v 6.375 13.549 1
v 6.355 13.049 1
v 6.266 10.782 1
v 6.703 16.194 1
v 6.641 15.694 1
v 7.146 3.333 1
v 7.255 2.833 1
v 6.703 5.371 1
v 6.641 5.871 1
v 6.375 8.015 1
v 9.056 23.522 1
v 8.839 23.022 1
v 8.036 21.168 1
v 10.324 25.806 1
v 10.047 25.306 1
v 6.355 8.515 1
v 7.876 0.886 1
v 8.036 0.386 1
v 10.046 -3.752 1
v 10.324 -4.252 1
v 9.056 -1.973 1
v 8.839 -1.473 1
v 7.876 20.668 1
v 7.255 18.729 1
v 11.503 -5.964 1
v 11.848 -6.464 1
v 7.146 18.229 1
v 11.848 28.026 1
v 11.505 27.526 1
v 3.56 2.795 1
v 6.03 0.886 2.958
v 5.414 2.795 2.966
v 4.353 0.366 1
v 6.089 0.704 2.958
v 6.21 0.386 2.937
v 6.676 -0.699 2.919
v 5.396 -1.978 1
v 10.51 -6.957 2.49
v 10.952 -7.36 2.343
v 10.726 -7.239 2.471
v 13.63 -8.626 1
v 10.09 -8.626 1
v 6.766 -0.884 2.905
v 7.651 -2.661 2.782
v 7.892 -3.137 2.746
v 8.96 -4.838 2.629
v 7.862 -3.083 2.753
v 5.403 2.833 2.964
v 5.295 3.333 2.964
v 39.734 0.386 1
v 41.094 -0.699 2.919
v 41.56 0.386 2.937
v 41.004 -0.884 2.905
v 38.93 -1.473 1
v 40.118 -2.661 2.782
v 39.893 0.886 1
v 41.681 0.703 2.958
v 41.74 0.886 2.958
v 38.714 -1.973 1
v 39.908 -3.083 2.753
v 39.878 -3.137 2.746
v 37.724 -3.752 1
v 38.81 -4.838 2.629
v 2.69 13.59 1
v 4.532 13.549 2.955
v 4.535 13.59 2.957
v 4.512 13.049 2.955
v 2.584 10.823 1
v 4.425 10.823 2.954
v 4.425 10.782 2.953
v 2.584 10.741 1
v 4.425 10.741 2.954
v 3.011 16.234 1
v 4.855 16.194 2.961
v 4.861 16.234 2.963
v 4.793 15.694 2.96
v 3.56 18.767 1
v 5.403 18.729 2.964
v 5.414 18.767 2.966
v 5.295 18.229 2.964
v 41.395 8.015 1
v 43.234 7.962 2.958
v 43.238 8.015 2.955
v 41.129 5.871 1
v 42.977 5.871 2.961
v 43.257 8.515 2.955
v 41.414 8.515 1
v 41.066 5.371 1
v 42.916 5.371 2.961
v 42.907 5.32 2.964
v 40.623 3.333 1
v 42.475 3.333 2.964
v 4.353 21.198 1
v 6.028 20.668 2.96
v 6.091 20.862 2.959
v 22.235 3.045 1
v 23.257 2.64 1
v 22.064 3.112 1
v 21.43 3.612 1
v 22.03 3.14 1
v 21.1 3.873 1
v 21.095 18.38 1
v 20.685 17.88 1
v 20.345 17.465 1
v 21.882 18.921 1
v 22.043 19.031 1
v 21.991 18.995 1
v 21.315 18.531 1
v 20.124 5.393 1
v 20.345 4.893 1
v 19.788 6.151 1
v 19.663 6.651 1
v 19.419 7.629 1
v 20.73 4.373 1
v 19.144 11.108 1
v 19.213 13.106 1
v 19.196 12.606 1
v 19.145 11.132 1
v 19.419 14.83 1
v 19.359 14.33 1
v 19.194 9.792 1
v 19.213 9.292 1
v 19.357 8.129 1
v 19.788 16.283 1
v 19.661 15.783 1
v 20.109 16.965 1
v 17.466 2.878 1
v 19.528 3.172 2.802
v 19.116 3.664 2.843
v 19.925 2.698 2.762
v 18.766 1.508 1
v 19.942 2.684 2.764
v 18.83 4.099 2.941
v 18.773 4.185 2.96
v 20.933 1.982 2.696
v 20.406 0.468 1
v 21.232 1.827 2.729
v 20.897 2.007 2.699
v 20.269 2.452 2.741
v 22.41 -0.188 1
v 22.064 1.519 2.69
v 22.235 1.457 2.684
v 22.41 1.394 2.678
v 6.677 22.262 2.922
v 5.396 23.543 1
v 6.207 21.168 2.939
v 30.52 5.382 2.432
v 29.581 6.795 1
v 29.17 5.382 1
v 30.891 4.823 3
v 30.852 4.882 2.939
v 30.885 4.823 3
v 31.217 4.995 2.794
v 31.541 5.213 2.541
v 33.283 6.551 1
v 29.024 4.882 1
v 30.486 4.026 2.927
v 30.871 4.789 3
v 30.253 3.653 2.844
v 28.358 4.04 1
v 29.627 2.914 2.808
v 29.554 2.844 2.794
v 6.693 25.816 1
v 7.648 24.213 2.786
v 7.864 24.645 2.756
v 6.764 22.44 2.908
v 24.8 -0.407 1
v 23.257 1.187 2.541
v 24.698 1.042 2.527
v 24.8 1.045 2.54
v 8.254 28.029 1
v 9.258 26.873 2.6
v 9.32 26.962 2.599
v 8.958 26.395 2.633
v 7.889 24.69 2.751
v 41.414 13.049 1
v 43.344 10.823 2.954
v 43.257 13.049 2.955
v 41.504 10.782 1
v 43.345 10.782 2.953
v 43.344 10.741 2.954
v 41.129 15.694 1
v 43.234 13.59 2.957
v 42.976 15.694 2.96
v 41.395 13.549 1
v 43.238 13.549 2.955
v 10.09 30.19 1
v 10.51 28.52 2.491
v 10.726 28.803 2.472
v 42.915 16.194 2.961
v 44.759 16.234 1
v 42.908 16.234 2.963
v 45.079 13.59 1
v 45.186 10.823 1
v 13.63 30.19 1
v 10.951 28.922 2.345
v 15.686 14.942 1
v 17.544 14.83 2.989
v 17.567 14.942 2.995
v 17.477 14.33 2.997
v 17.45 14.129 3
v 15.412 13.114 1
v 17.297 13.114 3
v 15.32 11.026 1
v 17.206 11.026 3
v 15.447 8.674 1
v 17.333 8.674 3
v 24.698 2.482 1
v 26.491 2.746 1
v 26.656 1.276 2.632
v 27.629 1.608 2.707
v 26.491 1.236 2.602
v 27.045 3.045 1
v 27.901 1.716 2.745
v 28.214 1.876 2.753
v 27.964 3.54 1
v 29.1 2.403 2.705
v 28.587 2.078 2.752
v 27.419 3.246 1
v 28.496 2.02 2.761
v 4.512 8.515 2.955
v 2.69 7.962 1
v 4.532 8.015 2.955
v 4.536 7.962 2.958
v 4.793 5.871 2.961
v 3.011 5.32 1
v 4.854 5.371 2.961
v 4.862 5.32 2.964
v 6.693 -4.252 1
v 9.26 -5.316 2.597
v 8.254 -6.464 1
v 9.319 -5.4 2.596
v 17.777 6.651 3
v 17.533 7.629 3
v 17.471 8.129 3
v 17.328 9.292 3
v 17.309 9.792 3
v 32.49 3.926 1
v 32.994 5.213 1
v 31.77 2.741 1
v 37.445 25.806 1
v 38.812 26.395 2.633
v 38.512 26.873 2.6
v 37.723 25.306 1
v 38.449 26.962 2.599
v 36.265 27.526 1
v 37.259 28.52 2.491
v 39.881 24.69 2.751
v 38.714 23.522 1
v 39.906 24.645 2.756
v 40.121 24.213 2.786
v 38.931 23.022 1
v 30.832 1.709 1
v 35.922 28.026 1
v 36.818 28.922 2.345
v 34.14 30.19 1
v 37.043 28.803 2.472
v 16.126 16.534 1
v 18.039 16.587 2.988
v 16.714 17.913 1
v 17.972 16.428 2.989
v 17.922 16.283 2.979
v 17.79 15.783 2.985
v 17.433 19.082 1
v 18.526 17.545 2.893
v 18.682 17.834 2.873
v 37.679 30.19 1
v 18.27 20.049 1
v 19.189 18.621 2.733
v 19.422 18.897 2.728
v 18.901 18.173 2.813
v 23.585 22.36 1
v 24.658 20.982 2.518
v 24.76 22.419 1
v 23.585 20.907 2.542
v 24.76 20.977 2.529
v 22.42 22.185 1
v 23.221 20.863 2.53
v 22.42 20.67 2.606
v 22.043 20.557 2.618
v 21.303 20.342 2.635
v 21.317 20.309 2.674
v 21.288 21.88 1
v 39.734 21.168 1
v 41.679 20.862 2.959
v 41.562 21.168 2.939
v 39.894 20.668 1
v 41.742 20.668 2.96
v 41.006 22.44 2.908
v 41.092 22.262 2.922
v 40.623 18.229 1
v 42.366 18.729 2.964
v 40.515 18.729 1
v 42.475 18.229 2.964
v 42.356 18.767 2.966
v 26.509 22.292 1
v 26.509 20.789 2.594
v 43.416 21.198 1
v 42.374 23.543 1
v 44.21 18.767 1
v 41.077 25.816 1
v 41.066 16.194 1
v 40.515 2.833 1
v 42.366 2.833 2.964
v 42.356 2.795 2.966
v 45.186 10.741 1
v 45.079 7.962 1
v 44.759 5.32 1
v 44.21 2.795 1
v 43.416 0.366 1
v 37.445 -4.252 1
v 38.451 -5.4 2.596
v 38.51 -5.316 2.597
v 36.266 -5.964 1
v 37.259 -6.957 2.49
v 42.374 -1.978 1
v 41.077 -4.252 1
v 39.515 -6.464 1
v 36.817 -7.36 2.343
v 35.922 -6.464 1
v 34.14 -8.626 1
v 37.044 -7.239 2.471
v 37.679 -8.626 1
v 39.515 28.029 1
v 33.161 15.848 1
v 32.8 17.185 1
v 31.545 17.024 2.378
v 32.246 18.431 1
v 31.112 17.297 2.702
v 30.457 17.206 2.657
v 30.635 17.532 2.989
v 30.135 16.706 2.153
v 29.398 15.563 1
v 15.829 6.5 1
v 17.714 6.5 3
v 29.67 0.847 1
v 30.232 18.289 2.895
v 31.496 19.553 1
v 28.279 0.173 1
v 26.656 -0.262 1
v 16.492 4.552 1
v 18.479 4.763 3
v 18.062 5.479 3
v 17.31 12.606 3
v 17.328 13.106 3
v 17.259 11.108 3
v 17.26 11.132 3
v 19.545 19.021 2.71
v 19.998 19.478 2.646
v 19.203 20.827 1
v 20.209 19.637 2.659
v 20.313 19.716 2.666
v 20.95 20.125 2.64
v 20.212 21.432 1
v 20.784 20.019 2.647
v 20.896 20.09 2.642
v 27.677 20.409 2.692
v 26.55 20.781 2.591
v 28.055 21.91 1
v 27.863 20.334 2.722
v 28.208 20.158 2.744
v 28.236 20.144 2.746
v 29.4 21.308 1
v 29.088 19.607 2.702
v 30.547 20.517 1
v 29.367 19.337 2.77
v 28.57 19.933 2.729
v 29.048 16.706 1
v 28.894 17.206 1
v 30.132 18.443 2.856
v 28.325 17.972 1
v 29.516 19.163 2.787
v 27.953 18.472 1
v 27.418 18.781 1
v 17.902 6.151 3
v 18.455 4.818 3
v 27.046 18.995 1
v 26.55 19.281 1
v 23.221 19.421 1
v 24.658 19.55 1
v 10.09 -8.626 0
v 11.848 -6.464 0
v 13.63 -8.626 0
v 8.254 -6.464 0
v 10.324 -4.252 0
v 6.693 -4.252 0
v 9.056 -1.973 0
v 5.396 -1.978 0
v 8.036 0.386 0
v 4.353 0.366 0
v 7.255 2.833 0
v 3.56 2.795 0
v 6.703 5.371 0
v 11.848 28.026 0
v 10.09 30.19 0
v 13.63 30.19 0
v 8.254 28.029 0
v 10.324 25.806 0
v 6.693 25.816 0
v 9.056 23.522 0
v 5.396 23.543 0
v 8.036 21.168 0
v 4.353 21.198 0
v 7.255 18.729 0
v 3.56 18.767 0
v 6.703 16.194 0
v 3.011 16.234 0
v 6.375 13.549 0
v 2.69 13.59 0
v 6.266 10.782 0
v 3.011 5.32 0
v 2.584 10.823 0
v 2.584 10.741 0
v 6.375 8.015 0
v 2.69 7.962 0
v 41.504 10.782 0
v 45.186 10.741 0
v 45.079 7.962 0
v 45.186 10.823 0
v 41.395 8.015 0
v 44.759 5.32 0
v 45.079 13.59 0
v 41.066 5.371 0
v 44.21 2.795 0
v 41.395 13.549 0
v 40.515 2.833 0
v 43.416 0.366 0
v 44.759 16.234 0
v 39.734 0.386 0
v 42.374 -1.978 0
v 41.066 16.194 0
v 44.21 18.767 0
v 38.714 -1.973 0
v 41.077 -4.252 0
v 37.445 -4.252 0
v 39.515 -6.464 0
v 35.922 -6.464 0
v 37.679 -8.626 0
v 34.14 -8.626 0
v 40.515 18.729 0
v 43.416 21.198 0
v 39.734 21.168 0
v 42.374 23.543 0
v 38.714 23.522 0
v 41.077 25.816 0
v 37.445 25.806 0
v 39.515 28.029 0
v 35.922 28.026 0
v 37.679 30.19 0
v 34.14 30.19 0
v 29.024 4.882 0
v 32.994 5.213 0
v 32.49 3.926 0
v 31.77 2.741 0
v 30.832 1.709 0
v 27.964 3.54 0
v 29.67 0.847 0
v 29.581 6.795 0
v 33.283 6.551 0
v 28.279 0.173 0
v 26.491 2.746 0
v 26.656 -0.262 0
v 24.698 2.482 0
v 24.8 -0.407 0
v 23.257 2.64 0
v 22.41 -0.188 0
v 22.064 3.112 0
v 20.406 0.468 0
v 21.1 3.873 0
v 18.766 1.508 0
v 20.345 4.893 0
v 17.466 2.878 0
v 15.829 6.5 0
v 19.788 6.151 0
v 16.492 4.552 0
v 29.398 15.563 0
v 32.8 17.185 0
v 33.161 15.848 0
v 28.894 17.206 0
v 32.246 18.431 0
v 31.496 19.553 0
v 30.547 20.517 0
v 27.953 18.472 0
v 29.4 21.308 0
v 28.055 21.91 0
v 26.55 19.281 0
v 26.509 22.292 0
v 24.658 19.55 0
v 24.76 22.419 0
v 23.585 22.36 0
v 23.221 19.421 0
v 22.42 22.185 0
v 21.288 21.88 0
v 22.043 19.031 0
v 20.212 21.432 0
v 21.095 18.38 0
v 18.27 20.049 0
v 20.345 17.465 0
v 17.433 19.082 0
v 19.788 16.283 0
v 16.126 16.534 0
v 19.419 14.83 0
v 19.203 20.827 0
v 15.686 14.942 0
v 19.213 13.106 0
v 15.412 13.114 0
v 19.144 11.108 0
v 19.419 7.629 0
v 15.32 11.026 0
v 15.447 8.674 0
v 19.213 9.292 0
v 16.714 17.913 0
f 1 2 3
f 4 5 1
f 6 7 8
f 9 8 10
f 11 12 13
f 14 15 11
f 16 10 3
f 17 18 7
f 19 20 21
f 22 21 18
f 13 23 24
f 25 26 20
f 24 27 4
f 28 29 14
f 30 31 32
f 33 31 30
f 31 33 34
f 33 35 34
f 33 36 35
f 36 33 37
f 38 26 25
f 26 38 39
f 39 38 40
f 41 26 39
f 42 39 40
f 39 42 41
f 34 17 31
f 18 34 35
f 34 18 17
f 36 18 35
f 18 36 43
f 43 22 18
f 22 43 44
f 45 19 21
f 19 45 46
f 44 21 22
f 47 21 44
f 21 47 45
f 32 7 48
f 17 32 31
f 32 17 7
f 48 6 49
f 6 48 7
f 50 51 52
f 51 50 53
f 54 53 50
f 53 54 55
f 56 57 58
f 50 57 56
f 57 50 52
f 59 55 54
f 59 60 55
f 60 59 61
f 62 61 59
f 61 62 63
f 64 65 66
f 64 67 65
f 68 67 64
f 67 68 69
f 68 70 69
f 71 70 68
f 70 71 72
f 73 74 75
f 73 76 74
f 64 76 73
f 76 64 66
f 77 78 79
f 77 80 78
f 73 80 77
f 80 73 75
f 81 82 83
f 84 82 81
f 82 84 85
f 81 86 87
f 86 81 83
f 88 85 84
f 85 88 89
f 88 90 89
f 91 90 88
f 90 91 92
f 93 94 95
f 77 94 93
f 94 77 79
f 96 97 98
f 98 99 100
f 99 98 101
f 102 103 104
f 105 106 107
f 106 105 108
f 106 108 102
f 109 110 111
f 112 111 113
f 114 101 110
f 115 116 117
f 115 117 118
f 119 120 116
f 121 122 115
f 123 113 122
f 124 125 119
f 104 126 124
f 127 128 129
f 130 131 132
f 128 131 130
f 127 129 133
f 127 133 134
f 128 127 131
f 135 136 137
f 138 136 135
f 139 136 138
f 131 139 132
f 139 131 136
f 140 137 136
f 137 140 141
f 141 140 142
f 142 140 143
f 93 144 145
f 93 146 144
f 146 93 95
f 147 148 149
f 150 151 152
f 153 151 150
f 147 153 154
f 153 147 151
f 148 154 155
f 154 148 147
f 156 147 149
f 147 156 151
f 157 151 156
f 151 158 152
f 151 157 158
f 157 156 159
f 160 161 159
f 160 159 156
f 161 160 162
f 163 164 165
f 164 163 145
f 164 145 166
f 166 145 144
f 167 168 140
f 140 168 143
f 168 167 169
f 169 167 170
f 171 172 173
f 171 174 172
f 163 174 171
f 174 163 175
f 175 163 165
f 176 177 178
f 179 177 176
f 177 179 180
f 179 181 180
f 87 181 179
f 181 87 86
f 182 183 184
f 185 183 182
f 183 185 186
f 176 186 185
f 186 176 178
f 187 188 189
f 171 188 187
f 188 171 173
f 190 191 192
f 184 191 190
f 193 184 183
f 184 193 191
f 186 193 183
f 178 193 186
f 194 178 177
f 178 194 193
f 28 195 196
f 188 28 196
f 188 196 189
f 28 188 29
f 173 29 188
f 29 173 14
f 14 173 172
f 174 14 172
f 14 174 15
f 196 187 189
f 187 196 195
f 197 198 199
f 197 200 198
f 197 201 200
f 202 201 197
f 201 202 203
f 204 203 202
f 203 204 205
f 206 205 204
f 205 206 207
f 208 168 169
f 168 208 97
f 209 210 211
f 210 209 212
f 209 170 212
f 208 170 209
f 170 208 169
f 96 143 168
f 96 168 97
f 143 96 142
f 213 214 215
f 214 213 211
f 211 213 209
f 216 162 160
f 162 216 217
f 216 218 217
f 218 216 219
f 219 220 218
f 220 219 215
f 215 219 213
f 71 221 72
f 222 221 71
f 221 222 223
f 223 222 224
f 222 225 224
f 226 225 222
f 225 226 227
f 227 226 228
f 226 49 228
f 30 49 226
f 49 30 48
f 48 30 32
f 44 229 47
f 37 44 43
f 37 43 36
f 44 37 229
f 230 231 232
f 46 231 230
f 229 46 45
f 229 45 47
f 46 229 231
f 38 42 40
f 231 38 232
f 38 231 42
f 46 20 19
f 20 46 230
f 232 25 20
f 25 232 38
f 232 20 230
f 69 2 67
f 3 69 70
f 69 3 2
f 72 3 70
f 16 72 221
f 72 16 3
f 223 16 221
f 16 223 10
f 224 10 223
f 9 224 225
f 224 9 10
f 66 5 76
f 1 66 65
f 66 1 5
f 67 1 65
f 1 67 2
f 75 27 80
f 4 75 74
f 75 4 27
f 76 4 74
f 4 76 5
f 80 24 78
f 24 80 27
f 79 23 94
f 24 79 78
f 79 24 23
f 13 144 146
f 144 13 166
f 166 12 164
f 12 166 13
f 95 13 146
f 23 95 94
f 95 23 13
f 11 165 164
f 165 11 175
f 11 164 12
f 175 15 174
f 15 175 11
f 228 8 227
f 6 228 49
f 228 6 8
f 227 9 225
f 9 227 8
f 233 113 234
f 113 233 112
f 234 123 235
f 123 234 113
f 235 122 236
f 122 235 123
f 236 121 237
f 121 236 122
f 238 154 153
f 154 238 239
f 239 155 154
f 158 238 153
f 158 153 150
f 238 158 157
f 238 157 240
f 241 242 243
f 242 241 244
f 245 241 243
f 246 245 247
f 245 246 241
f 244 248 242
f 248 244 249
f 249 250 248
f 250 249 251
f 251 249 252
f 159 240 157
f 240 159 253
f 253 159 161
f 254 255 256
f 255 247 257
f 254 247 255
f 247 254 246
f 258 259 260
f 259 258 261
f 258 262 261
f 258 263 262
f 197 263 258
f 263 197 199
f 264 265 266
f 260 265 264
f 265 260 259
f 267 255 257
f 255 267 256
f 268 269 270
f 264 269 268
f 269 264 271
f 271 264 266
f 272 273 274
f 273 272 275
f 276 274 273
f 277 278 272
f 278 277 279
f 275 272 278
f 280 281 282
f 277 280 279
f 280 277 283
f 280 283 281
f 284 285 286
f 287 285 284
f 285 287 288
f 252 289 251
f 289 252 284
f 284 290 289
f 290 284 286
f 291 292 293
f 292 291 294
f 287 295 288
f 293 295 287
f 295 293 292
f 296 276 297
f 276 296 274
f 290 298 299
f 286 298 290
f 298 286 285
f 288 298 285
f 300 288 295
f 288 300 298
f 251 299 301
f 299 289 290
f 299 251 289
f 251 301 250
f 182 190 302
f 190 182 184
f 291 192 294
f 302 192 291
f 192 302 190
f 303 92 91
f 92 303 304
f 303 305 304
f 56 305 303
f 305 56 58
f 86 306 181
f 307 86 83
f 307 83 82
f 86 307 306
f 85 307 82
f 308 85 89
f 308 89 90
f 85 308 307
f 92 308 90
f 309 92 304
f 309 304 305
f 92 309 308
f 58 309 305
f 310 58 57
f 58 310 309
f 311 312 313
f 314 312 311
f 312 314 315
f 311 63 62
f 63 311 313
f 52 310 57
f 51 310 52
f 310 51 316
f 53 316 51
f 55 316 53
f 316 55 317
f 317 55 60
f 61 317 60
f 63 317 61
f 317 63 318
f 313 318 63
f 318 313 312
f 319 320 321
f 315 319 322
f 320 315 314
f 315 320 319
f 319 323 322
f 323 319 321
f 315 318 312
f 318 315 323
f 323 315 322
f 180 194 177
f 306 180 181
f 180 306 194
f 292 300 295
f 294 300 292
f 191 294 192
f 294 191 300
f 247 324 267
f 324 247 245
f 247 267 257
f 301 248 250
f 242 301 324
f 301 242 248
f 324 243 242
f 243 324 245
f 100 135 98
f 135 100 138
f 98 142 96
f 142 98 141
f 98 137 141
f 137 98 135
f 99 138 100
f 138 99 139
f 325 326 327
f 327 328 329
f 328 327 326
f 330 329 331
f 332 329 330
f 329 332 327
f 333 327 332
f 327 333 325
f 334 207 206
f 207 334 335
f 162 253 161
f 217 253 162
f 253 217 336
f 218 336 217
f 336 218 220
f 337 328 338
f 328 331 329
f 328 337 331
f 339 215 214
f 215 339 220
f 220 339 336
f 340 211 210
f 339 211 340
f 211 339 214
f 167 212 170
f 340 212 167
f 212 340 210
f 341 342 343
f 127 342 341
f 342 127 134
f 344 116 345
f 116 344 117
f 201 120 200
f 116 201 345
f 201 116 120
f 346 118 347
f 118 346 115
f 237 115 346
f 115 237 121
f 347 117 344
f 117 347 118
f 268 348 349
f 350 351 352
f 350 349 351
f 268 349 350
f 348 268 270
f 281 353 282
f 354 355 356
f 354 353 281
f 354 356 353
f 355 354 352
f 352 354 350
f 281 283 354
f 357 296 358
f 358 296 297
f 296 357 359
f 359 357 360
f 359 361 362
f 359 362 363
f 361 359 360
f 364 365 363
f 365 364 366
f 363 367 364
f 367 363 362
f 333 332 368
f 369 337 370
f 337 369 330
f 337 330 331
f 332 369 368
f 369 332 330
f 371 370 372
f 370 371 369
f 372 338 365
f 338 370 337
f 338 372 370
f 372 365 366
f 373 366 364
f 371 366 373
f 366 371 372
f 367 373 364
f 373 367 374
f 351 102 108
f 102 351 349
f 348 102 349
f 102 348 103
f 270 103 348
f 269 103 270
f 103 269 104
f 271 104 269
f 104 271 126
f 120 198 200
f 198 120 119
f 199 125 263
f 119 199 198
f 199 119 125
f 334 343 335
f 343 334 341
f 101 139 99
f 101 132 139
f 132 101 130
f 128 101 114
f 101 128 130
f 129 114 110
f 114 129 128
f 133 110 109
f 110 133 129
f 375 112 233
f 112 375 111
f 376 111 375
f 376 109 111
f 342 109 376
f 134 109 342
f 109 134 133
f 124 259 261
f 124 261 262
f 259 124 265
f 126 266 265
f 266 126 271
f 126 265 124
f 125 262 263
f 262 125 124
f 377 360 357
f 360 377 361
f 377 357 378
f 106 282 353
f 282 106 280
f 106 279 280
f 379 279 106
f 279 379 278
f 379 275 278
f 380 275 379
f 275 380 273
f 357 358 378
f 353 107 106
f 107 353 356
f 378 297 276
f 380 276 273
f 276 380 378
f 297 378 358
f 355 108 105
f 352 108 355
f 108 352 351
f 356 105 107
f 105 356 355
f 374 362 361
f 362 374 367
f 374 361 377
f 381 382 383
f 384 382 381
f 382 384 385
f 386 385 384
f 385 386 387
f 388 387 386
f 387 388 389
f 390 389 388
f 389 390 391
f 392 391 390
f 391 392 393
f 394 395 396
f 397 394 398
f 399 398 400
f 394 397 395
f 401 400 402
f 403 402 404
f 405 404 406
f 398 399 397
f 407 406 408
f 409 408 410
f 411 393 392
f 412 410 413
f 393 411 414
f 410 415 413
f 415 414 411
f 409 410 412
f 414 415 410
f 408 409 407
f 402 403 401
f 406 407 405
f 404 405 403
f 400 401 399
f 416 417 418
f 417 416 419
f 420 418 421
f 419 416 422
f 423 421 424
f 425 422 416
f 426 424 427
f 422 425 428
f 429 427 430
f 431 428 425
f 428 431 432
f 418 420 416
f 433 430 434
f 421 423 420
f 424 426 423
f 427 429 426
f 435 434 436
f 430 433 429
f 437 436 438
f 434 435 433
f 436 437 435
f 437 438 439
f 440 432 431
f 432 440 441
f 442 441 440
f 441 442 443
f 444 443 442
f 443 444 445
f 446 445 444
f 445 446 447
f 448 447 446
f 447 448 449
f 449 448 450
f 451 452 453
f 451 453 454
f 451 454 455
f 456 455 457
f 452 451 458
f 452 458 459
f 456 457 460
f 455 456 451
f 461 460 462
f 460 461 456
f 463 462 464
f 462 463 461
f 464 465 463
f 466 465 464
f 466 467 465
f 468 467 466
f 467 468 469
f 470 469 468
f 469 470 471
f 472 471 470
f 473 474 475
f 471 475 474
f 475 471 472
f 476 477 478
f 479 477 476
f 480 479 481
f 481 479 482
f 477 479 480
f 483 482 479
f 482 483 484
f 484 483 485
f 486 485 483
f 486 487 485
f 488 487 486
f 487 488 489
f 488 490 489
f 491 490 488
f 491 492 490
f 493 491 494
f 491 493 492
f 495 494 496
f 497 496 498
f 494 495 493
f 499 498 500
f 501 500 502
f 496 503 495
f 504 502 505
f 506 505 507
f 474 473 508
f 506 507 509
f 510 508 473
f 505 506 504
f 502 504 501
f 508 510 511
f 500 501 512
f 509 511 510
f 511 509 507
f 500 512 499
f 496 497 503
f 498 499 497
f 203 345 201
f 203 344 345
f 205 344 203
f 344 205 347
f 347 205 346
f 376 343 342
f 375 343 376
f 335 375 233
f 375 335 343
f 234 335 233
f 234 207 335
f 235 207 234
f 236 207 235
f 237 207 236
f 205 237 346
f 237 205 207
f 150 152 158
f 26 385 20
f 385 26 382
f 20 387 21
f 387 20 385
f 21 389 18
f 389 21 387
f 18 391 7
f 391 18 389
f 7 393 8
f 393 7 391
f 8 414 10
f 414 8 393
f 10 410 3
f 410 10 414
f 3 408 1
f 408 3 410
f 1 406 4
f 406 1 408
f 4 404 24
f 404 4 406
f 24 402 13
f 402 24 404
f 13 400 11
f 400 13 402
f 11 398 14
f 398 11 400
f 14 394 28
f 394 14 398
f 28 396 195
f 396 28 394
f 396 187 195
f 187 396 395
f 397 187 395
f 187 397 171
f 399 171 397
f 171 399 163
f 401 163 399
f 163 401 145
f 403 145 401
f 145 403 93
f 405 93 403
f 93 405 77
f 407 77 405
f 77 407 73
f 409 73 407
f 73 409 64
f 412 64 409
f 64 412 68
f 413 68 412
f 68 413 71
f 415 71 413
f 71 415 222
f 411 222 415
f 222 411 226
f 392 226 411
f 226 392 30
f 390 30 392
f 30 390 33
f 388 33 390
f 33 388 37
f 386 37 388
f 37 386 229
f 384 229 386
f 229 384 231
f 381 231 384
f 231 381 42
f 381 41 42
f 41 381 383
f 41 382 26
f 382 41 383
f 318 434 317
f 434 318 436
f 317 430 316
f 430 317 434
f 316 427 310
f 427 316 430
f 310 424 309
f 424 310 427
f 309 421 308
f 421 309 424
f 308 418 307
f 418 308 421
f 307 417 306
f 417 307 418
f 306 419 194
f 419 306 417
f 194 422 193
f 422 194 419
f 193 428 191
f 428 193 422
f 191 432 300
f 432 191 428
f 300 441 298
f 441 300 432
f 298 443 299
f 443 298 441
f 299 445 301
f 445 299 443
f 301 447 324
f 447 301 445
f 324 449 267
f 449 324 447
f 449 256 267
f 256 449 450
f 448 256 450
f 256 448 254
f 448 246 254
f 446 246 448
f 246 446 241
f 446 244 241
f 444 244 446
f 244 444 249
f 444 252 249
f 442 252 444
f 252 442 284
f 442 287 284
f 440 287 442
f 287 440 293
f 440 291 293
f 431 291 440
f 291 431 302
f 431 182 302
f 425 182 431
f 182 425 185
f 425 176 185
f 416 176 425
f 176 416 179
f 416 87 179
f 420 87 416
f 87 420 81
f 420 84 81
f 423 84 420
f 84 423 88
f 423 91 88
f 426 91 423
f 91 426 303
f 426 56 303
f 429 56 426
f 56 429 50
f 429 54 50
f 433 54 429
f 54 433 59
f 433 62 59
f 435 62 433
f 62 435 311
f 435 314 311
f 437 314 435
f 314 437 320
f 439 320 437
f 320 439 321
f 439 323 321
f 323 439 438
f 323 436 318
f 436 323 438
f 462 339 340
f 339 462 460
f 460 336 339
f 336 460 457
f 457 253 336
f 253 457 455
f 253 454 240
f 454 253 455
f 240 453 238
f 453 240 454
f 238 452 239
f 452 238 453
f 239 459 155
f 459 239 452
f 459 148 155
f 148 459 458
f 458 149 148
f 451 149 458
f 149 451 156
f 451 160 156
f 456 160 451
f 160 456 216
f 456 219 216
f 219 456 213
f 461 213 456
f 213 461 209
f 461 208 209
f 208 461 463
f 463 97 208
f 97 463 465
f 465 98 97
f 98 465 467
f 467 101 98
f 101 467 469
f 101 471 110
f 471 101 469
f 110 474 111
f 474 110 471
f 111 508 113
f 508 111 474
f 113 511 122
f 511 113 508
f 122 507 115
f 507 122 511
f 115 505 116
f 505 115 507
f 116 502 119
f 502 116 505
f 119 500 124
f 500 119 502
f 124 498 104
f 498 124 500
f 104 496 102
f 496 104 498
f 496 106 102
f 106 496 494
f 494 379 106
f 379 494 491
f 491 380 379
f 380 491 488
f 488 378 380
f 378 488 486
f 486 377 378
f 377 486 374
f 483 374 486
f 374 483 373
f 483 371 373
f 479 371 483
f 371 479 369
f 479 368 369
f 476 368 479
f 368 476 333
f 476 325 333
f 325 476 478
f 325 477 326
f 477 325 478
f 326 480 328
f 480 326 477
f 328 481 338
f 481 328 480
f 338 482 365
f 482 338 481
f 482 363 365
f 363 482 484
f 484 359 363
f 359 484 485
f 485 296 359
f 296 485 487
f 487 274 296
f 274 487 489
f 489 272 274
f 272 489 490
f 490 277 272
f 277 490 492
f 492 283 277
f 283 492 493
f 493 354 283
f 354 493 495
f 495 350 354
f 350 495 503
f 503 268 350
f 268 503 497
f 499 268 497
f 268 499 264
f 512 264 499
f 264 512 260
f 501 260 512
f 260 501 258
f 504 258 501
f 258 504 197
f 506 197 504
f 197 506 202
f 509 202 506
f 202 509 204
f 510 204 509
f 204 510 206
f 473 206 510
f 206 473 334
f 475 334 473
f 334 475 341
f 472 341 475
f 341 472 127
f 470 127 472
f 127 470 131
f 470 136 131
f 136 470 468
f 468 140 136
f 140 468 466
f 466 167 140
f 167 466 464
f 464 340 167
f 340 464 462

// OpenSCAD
// file: bevel_extrude.scad
bevel_extrude_example();

module bevel_extrude_example()
{
	bevel_extrude(height=10,bevel_depth=2,$fn=16) 
	example_shape();
}

module example_shape()
{
	union()
	{
		square([8,30],true);
		rotate(30)
		square([35,8],true);
	
		translate([0,15])
		square([30,8],true);
	}
}

module bevel_border(size=1)
{
	difference()
	{
		minkowski()
		{
			child();
			square(size,true);
		}
		child();
	}
}

module bevel_cutaway(bevel_depth=5)
{
	translate([0,0,-bevel_depth])
	minkowski()
	{
		linear_extrude(height=bevel_depth,convexity=5)
		bevel_border(1)
		child();
		cylinder(h=bevel_depth+1,r1=0,r2=bevel_depth*sqrt(2));
	}
}

module bevel_extrude(height=20,bevel_depth=1)
{
	difference()
	{
		linear_extrude(height=height,convexity=5)
		child();

		translate([0,0,height])
		bevel_cutaway(bevel_depth)
		child();
	}	
}
// main file
use <bevel_extrude.scad>

module shape()
{
	text("(c)", size=30);
}

bevel_extrude(height=3,bevel_depth=2,$fn=8) shape();

// translate([-40,0,0]) shape();
